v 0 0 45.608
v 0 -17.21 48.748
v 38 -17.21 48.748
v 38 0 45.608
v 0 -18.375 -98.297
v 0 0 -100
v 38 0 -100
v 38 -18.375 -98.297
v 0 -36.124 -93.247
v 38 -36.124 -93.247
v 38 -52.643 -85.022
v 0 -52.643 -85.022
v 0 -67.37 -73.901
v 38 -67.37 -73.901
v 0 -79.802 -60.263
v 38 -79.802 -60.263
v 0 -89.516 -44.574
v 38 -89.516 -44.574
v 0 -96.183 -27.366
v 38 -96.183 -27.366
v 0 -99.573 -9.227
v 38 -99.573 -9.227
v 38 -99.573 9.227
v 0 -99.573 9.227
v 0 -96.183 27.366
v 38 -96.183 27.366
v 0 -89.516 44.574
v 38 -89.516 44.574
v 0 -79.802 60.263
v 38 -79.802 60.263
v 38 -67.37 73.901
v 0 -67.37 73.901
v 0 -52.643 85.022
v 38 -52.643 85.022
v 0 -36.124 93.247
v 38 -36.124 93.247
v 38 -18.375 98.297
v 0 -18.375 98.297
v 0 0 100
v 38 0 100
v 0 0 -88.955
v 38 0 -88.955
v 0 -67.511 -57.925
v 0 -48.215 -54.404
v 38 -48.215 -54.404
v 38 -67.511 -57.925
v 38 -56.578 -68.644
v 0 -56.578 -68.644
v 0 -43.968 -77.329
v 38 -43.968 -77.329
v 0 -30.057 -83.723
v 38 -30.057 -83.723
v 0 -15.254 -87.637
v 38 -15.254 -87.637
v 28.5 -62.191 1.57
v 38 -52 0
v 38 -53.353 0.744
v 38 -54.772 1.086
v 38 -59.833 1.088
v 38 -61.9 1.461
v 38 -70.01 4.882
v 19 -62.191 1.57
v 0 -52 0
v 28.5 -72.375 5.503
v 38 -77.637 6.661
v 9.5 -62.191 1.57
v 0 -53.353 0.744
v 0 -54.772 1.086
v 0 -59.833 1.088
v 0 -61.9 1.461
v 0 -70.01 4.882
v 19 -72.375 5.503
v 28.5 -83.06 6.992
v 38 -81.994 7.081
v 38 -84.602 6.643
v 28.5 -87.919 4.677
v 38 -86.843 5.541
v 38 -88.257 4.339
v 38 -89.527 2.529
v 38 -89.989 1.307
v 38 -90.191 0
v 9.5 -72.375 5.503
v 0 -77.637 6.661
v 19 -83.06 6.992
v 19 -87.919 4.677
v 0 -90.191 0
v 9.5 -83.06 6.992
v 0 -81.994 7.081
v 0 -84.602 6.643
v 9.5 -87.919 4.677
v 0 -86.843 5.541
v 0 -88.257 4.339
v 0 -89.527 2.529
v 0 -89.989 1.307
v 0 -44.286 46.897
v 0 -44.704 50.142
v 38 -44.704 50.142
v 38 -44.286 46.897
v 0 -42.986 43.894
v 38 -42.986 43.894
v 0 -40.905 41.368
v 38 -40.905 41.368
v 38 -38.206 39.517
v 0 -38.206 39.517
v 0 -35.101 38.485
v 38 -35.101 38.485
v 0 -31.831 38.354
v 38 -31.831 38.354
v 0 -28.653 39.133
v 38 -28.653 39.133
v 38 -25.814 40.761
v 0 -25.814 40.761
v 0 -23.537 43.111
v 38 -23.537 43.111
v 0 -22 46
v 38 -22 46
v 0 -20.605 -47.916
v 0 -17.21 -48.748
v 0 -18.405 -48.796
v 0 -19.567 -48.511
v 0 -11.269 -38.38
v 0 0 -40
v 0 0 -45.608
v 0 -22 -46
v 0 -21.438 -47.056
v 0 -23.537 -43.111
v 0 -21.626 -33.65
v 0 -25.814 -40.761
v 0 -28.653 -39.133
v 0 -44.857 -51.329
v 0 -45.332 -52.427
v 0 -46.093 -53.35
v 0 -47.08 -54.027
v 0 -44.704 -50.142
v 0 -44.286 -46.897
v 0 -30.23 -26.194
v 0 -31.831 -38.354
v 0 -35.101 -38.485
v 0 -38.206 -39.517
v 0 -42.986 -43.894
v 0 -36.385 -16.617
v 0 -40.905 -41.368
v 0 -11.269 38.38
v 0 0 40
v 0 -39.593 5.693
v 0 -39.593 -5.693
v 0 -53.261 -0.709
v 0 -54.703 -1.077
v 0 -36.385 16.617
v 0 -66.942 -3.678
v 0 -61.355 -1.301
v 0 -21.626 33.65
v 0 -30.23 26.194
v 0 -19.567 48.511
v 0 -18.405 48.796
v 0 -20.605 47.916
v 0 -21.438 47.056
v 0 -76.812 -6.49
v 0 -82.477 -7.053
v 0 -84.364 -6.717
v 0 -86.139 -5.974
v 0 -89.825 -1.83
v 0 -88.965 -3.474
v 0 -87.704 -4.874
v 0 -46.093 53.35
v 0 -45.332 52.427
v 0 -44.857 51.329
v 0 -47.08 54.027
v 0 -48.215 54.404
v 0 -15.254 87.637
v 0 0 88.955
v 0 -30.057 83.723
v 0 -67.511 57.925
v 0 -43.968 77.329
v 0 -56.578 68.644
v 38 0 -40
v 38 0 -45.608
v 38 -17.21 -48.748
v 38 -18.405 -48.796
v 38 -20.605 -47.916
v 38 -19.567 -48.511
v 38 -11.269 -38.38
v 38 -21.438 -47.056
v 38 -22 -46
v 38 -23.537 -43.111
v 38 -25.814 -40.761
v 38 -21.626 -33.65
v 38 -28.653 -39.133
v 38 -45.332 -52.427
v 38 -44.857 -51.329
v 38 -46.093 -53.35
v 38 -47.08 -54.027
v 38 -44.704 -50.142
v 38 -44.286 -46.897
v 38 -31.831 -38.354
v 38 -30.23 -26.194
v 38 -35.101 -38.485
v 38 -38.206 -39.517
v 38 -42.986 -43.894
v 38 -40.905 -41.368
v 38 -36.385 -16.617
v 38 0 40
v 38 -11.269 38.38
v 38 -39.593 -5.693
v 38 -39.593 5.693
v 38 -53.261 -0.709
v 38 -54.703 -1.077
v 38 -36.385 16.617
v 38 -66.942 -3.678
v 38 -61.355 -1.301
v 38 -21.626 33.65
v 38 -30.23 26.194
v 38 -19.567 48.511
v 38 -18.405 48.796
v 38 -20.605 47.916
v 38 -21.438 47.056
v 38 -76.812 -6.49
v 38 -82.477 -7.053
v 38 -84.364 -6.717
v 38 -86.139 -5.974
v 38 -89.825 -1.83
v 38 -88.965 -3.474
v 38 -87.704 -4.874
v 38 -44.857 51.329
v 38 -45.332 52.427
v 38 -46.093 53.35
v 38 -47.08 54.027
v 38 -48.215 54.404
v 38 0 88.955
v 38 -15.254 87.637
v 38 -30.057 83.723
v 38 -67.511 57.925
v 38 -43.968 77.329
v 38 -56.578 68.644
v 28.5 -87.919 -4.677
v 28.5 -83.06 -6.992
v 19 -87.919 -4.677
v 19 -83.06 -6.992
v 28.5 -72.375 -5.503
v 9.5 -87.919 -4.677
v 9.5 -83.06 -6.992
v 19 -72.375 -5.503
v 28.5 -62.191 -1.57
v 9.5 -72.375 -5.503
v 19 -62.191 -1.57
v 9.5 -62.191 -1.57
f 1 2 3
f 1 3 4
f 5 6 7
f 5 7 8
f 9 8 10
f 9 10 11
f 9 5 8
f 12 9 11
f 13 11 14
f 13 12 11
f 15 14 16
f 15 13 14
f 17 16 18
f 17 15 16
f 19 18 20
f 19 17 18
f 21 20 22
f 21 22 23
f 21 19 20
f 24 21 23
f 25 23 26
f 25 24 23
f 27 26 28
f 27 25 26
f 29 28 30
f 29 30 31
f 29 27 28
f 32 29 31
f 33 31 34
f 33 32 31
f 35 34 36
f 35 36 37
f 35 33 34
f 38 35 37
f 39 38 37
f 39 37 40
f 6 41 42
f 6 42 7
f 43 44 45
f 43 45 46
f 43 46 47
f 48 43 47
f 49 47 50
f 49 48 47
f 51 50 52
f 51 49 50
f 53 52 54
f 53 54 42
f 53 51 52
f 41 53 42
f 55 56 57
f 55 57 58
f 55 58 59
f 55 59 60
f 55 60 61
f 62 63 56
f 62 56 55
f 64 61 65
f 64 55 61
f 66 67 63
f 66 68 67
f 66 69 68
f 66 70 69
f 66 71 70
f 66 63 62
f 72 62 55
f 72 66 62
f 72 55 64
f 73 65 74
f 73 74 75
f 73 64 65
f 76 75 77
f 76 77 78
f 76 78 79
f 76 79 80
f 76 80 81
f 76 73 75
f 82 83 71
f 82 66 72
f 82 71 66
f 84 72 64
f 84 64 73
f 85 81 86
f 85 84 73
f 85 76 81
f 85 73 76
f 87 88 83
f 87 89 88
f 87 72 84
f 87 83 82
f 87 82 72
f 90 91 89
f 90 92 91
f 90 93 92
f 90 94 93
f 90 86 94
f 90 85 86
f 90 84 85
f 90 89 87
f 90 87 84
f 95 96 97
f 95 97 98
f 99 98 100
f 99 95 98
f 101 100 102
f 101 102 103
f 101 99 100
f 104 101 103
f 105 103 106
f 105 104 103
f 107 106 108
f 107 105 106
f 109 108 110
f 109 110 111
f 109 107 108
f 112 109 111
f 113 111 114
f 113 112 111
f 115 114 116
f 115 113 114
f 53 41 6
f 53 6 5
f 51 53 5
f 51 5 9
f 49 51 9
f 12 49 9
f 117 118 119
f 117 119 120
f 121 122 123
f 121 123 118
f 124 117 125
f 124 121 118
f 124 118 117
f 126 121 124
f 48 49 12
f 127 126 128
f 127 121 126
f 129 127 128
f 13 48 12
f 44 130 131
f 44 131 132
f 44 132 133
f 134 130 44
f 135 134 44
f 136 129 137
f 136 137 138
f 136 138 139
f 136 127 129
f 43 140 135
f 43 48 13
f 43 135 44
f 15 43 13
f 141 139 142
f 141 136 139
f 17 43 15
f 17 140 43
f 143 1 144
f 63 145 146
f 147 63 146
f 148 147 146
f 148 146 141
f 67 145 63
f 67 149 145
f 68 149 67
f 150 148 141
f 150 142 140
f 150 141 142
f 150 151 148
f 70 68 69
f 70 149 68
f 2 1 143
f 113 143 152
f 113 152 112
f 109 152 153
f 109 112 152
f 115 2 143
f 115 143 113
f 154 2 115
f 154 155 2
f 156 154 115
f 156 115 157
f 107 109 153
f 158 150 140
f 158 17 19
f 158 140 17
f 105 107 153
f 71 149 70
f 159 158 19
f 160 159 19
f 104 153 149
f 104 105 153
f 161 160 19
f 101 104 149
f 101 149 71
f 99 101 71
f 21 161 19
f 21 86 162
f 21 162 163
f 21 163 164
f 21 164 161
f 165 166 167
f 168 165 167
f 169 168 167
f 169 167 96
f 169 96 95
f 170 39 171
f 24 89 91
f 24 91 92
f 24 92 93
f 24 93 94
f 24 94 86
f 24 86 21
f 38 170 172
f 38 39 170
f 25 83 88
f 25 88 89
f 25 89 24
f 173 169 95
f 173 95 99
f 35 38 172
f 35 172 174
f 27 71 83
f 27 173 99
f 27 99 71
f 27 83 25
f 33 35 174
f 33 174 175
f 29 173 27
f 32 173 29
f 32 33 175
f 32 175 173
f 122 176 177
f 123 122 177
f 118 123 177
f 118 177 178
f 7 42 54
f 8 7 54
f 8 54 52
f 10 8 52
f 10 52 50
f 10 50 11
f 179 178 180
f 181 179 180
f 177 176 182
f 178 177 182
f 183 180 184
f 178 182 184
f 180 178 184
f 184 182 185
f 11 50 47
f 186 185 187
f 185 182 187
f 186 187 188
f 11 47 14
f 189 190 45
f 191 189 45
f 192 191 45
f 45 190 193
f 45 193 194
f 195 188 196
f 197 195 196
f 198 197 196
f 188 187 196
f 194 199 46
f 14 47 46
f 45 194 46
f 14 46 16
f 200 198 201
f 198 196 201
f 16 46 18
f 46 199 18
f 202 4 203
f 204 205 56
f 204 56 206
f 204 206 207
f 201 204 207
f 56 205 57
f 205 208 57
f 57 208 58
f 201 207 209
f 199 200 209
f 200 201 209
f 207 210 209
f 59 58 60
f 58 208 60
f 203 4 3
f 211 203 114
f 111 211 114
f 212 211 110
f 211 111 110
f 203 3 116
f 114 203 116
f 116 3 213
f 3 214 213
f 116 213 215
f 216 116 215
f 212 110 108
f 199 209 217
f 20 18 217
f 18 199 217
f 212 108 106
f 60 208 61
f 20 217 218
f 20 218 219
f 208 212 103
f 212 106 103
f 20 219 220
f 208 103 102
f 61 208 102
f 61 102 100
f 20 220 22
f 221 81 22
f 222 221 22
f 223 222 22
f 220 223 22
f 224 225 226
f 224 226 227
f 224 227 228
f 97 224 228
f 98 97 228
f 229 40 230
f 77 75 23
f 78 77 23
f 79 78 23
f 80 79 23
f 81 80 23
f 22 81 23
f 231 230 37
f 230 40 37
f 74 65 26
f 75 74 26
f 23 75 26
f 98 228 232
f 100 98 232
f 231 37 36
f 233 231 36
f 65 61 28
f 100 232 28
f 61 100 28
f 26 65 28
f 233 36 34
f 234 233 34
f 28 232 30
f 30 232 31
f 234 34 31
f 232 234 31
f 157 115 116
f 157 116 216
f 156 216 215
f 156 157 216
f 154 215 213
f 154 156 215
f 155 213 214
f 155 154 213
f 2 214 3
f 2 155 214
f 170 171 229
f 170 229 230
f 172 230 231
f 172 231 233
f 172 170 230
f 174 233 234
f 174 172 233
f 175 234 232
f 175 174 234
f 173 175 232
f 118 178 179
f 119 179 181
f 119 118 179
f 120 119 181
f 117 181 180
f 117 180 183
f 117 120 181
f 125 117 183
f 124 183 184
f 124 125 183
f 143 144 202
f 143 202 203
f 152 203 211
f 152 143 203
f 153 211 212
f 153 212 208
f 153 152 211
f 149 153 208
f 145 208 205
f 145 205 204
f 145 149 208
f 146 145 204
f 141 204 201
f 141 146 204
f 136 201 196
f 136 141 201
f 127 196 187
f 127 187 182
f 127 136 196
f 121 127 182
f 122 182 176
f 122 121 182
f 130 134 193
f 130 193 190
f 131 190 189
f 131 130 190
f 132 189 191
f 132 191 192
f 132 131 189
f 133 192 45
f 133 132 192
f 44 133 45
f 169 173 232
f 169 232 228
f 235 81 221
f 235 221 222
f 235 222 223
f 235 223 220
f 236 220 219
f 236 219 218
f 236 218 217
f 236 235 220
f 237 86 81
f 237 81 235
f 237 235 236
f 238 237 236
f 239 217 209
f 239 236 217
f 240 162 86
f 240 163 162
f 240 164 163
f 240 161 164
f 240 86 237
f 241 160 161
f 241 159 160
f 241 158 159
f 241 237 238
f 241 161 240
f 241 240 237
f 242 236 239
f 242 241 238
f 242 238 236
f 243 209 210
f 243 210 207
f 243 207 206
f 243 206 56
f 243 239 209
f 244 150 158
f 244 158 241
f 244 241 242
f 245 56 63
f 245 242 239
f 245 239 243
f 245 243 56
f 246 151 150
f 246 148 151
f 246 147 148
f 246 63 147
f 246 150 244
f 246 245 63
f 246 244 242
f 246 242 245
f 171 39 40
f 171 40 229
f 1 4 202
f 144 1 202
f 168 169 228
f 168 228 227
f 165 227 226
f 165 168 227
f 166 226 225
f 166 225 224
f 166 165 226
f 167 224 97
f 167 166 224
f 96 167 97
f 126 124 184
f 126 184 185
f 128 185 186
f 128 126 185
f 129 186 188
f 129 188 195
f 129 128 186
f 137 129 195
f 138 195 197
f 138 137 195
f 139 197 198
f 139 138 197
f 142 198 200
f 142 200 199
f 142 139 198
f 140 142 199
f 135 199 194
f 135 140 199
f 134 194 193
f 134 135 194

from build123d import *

# Parameters (mm, degrees)
BOSS_EXTRUDE1_DEPTH = 38


with BuildPart() as part:
    # Sketch1 → Boss-Extrude1 (new body)
    with BuildSketch(Plane(origin=(0, 0, 0), x_dir=(0, -1, 0), z_dir=(-1, 0, 0))):
        with BuildLine():
            Line((17.209546758, 48.747753074), (0, 45.608021319))
            Line((0, 45.608021319), (0, 40))
            ThreePointArc((0, 40), (40, 0), (0, -40))
            Line((0, -40), (0, -45.608021319))
            Line((0, -45.608021319), (17.209546758, -48.747753074))
            ThreePointArc((17.209546758, -48.747753074), (20.107264785, -48.24985544), (22.000023251, -45.999936061))
            ThreePointArc((22.000023251, -45.999936061), (35.10074516, -38.485362803), (44.70383792, -50.142049092))
            ThreePointArc((44.70383792, -50.142049092), (45.680143747, -52.915404235), (48.215353578, -54.404492187))
            Line((48.215353578, -54.404492187), (67.510876588, -57.924792122))
            ThreePointArc((67.510876588, -57.924792122), (37.150353432, -80.826055452), (0, -88.955044826))
            Line((0, -88.955044826), (0, -100))
            ThreePointArc((0, -100), (100, 0), (0, 100))
            Line((0, 100), (0, 88.955044826))
            ThreePointArc((0, 88.955044826), (37.150353432, 80.826055452), (67.510876588, 57.924792122))
            Line((67.510876588, 57.924792122), (48.215353578, 54.404492187))
            ThreePointArc((48.215353578, 54.404492187), (45.680143747, 52.915404235), (44.70383792, 50.142049092))
            ThreePointArc((44.70383792, 50.142049092), (35.10074516, 38.485362803), (22.000023251, 45.999936061))
            ThreePointArc((22.000023251, 45.999936061), (20.107264785, 48.24985544), (17.209546758, 48.747753074))
        make_face()
        with BuildLine():
            add(Edge.make_bspline(
                [(52, 0), (55.06830649, 2.314828746), (58.844383808, 0.214472049), (65.537828774, 2.925828908), (68.845366533, 4.841132392), (75.905131868, 6.165625008), (79.446058218, 7.457393158), (86.674587248, 6.527455746), (90.026510297, 3.61430509), (90.191479957, 0)],
                knots=[0, 0, 0, 0, 0.25, 0.25, 0.5, 0.5, 0.75, 0.75, 1, 1, 1, 1], degree=3))
            add(Edge.make_bspline(
                [(90.191479957, 0), (90.026510297, -3.61430509), (86.674587248, -6.527455746), (79.446058218, -7.457393158), (75.905131868, -6.165625008), (68.845366533, -4.841132392), (65.537828774, -2.925828908), (58.844383808, -0.214472049), (55.06830649, -2.314828746), (52, 0)],
                knots=[0, 0, 0, 0, 0.25, 0.25, 0.5, 0.5, 0.75, 0.75, 1, 1, 1, 1], degree=3))
        make_face(mode=Mode.SUBTRACT)
    extrude(amount=-BOSS_EXTRUDE1_DEPTH)


solid = part.part
